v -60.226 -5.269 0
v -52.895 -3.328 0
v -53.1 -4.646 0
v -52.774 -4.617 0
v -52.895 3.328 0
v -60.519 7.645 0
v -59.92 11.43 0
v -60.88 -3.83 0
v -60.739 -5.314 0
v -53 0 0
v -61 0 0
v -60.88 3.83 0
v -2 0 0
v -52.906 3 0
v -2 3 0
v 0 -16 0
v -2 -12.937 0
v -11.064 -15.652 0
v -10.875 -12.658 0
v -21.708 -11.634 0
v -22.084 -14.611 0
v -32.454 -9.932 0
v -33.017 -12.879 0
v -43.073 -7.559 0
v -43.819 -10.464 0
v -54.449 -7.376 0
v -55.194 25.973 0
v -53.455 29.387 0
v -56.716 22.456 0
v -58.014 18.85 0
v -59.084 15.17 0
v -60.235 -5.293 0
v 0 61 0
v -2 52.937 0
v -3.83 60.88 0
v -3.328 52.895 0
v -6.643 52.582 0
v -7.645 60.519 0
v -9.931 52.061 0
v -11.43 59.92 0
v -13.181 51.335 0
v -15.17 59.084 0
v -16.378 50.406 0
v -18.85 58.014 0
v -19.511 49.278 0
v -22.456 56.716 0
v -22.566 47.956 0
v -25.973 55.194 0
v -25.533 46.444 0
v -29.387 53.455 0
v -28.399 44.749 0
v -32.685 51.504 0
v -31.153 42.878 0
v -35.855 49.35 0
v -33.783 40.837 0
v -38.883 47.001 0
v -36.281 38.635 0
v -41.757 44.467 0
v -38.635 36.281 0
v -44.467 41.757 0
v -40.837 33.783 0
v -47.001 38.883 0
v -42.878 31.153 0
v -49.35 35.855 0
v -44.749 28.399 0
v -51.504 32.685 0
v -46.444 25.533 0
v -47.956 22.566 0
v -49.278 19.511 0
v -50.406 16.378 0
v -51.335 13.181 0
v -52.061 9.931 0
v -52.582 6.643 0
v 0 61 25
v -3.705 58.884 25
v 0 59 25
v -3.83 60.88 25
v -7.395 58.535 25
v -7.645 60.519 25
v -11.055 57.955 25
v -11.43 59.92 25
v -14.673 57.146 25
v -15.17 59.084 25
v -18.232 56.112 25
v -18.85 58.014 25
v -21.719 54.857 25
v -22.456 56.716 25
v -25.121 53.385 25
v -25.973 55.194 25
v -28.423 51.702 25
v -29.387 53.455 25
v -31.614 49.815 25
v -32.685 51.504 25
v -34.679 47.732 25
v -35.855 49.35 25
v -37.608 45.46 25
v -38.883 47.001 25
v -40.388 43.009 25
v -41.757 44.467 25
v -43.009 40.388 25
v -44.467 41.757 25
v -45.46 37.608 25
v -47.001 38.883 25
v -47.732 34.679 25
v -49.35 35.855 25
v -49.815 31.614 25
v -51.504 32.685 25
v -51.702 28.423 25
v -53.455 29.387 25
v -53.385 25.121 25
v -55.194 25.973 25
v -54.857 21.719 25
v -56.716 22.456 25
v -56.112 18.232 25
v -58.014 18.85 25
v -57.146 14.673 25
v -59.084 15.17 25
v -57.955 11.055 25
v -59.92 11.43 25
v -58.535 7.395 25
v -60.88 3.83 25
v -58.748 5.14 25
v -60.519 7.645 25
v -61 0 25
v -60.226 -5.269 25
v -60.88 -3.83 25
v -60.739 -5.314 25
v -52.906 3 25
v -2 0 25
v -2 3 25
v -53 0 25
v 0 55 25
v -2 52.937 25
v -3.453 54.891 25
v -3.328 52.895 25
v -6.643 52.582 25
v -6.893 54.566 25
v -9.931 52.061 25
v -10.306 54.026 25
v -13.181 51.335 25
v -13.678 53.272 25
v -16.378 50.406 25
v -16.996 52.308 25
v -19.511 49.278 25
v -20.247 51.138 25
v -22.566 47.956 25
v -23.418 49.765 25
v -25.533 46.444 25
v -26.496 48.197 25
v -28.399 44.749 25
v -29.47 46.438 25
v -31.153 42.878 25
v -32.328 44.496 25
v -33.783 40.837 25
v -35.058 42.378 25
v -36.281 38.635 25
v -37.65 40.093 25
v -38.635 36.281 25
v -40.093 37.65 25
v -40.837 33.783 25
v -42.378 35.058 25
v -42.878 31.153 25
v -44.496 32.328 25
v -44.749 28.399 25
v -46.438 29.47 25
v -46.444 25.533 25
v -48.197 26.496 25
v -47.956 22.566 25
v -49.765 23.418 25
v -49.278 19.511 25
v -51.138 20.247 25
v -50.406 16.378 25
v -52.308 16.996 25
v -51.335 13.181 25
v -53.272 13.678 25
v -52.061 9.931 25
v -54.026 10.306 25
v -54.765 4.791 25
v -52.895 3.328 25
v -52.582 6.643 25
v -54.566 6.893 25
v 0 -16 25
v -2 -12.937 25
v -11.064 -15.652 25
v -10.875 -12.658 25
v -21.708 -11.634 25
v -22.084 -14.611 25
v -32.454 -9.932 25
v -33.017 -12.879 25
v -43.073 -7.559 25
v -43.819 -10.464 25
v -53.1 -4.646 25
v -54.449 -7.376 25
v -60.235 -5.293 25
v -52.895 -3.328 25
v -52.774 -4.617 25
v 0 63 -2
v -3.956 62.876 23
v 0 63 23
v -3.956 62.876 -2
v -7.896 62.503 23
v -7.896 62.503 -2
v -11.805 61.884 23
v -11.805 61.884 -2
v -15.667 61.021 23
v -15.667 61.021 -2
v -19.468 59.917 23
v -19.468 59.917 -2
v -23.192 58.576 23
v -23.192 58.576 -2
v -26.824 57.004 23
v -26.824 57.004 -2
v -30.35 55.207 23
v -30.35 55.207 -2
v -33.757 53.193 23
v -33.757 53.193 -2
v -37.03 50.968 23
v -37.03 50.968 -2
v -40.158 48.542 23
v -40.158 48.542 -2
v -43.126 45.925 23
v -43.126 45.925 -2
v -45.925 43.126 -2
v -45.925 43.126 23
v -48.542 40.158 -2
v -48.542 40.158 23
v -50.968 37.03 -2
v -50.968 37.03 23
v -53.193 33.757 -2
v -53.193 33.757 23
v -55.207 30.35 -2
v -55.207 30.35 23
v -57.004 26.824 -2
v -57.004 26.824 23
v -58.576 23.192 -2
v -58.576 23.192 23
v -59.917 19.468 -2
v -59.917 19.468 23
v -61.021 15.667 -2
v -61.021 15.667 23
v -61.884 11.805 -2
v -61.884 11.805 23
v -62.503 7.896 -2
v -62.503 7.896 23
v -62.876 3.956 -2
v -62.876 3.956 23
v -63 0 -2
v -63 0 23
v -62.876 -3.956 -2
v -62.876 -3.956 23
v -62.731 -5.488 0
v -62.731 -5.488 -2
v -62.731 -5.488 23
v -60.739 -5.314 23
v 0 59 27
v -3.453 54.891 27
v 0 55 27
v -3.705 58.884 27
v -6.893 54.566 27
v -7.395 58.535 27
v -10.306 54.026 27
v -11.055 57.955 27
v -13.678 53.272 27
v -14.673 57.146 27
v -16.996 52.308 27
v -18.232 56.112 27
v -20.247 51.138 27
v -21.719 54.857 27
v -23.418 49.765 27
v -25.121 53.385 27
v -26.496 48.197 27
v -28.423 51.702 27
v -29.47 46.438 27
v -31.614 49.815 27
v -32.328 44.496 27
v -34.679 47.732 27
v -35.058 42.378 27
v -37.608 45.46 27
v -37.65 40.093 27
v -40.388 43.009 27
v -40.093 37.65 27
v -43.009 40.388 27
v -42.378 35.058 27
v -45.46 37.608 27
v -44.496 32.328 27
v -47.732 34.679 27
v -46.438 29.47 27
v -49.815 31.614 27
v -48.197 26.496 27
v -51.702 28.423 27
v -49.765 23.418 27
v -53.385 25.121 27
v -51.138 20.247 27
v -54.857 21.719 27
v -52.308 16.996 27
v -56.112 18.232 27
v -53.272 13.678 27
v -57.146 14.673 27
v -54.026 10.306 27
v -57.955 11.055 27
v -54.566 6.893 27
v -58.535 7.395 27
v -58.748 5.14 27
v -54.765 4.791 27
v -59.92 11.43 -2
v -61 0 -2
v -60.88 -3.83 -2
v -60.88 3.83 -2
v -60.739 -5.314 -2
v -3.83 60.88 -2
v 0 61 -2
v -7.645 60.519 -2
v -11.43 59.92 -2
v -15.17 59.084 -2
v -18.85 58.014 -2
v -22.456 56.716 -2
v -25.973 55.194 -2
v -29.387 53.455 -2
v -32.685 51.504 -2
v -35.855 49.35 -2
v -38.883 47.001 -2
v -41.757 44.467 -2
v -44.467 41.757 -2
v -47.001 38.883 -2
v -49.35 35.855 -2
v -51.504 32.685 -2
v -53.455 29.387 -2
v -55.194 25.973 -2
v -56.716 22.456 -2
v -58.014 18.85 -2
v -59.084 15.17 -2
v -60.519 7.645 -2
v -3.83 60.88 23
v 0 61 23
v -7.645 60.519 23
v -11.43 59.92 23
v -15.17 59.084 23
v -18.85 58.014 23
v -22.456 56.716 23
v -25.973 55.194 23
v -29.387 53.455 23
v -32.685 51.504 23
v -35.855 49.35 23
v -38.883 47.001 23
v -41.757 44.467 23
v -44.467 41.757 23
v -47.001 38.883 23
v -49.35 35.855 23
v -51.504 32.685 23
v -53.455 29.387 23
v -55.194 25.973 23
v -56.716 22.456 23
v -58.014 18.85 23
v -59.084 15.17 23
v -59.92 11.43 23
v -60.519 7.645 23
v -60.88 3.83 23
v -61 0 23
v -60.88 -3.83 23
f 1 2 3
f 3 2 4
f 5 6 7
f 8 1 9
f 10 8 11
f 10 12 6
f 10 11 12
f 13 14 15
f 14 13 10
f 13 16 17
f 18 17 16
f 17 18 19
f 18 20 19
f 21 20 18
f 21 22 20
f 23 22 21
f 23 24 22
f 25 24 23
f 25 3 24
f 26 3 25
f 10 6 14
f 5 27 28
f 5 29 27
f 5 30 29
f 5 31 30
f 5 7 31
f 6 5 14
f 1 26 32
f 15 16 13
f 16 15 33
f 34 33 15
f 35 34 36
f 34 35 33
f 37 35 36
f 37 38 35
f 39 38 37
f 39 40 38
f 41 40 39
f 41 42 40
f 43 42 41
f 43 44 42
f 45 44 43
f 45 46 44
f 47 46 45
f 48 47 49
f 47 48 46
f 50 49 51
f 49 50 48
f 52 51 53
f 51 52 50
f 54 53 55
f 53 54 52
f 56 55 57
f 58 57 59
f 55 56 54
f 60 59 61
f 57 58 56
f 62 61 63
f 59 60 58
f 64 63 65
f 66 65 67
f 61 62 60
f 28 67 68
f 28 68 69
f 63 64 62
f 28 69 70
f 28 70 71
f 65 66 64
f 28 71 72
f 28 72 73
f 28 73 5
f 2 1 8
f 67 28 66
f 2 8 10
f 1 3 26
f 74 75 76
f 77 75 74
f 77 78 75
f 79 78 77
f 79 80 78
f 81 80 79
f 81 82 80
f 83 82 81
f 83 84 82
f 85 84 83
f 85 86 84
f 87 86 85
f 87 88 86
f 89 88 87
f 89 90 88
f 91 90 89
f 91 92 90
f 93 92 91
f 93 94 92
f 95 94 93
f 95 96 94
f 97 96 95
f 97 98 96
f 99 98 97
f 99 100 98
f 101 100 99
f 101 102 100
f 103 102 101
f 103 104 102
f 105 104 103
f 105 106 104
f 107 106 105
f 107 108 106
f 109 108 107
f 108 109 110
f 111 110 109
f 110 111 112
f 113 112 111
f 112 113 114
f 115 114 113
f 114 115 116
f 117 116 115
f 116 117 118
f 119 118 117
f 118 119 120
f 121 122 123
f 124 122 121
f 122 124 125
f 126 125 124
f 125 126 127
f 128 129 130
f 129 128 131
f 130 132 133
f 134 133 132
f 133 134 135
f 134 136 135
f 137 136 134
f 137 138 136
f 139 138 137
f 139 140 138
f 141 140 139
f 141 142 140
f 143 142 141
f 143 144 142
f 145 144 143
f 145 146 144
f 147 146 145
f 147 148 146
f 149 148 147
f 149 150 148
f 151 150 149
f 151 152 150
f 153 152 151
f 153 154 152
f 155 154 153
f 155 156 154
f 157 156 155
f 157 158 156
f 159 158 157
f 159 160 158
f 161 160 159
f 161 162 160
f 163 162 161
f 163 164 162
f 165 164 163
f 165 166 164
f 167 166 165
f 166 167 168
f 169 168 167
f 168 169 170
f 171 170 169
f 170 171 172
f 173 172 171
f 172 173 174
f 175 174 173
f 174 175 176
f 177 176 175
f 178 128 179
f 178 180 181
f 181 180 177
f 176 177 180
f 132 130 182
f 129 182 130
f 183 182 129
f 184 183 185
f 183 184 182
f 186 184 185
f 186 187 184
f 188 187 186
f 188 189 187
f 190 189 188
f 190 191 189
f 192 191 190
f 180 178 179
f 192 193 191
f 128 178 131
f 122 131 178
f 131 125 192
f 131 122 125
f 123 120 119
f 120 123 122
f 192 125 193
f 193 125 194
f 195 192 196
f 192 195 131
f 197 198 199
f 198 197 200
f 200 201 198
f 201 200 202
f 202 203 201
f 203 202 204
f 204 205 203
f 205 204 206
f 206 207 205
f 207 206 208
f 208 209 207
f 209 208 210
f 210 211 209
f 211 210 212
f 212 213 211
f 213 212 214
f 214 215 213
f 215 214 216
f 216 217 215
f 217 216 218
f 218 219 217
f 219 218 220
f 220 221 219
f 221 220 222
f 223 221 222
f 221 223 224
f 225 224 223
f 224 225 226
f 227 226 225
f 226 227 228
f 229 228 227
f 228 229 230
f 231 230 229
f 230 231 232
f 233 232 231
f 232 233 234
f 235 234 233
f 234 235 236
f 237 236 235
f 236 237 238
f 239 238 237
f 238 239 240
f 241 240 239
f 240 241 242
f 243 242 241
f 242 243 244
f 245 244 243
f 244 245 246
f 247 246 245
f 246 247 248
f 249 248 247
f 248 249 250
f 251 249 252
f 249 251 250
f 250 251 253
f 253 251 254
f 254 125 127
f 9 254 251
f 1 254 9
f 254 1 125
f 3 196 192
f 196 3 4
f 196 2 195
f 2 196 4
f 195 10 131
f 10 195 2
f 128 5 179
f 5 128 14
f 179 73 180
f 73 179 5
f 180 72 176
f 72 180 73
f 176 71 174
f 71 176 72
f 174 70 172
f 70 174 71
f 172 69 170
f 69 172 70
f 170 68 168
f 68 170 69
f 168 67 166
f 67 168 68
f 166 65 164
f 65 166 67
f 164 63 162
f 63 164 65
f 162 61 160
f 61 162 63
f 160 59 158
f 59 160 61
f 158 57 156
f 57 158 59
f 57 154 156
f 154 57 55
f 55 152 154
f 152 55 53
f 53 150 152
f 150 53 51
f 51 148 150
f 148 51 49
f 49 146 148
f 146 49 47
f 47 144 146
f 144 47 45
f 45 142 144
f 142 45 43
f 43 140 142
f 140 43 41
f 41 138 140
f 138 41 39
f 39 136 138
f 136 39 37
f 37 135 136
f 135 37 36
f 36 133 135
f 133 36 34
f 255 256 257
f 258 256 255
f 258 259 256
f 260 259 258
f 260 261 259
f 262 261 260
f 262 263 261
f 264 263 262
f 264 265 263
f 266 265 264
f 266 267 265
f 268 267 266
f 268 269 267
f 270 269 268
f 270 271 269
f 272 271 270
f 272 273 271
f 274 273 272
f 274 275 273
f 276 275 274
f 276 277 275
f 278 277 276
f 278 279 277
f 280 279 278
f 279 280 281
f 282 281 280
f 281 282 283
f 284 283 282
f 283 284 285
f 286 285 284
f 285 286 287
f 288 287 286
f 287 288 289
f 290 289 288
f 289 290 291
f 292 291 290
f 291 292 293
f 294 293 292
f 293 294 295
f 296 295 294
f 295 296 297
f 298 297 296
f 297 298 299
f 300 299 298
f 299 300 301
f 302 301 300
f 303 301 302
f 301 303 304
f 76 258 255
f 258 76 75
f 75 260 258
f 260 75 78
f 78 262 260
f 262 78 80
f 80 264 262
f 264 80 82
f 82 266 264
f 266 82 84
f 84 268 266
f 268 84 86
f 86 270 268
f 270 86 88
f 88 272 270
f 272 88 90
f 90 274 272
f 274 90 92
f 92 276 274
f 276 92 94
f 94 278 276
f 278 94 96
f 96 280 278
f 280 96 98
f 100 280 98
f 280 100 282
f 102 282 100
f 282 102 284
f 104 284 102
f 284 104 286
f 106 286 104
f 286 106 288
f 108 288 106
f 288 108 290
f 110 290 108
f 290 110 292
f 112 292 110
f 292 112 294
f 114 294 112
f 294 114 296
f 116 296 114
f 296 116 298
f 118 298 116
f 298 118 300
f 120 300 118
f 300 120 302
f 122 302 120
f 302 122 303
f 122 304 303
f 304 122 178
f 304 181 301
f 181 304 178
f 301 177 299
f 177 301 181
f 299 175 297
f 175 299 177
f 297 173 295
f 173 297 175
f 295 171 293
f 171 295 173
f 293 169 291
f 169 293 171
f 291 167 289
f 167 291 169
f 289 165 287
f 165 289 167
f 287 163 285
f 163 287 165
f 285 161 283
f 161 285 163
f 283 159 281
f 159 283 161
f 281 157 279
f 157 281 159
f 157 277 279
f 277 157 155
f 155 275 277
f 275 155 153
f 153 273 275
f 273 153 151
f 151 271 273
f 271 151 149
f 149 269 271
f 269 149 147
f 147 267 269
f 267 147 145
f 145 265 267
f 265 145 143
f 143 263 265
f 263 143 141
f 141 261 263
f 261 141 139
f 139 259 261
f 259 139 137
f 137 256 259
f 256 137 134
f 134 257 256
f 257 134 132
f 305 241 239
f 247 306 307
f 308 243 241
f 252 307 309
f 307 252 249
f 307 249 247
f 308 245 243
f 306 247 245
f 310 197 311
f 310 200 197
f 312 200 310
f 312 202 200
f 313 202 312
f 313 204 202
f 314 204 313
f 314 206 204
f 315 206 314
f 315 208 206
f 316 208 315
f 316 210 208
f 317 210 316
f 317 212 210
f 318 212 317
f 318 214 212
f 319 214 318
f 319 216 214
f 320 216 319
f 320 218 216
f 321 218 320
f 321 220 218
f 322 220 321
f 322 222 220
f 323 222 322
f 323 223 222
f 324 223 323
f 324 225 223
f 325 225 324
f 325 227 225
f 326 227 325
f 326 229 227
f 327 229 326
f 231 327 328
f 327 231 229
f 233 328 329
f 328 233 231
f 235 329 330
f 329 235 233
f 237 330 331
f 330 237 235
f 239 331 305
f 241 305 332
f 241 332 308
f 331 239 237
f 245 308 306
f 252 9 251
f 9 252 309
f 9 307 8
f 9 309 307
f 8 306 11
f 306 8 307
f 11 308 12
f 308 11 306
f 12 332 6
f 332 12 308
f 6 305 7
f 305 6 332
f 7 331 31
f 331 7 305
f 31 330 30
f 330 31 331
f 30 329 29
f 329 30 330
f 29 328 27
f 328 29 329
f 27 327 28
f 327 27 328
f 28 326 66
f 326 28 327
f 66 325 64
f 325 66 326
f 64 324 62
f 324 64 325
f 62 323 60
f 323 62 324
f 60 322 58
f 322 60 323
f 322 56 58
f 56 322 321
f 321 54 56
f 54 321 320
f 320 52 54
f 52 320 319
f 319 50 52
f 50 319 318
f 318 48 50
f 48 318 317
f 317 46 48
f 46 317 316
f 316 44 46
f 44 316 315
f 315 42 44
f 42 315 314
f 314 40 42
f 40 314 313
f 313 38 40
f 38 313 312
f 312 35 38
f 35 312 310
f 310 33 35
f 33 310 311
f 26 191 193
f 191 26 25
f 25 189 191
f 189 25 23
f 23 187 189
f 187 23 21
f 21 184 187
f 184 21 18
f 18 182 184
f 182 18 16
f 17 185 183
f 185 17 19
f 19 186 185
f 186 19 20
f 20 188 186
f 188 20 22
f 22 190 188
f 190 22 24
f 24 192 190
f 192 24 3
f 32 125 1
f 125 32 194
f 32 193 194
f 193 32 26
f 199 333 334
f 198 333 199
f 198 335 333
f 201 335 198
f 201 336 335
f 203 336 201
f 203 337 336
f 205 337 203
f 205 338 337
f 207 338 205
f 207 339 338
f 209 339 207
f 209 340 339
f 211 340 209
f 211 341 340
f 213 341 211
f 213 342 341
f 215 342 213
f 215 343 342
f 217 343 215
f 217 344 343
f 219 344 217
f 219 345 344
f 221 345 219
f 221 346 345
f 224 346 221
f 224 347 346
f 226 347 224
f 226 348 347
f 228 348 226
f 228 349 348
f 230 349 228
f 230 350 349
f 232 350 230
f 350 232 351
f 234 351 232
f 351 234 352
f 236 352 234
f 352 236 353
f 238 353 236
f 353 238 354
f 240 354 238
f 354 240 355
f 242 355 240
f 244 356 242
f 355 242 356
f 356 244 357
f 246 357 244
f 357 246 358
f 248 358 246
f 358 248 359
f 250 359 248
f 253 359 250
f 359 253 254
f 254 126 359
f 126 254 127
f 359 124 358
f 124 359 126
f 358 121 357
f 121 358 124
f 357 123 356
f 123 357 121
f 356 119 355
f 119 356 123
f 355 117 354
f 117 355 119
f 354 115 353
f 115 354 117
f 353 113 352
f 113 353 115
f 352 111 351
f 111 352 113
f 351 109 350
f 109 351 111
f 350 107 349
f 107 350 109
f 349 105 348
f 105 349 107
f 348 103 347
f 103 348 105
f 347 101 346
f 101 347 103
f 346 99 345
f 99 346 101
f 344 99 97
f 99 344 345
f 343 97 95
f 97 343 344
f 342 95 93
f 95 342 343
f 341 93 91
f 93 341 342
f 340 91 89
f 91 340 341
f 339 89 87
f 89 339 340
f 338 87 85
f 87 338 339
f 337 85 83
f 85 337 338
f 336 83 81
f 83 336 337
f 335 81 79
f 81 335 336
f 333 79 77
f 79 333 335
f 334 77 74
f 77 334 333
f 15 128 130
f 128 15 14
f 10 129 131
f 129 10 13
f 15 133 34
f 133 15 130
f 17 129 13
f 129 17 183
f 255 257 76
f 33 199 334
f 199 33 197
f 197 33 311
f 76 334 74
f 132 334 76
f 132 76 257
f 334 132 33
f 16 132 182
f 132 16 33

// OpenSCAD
radius = 55;
radius2 = 173.2;
fn = 100;
height = 25;

module sector(radius, angles, fn = 24) {
    r = radius / cos(180 / fn);
    step = -360 / fn;

    points = concat([[0, 0]],
        [for(a = [angles[0] : step : angles[1] - 360]) 
            [r * cos(a), r * sin(a)]
        ],
        [[r * cos(angles[1]), r * sin(angles[1])]]
    );

    difference() {
        circle(radius, $fn = fn);
        polygon(points);
    }
}

module arc(radius, angles, width = 1, fn = 24) {
    difference() {
        sector(radius + width, angles, fn);
        sector(radius, angles, fn);
    }
}

module part() {
    x = -5;
    y = 185;
    difference() {
        union() {
            linear_extrude(height)
                arc(radius-2, [x,y], 10, fn);
            translate([0,0,height])
                linear_extrude(2)
                    arc(radius, [x+10,y-10], 4, fn);
            translate([0,0,-2])
                ring(x,y);
            // circular segment:
            // 10mm height for 2*radius cord length
            translate([0,radius2-10+2-5,0])
                linear_extrude(height)
                    arc(radius2, [-70,-110], 3, fn);
        }

        translate([0,0,height-2])
            ring(x,y);
    }
}

module ring(x,y) {
    linear_extrude(2) difference() {
        arc(radius-2, [x,y], 10, fn);
        arc(radius-2, [x,y], 8, fn);
    }
}

module bridge2() {
    translate([-radius,0,0])
        cube([2*radius,3,height]);
}

difference() {
    union() {
        part();
        bridge2();
        translate([-2,-14,0])
            cube([4,radius-2+14,height]);
    }
    translate([00,-100,-100])
        cube([200,200,200]);
}
